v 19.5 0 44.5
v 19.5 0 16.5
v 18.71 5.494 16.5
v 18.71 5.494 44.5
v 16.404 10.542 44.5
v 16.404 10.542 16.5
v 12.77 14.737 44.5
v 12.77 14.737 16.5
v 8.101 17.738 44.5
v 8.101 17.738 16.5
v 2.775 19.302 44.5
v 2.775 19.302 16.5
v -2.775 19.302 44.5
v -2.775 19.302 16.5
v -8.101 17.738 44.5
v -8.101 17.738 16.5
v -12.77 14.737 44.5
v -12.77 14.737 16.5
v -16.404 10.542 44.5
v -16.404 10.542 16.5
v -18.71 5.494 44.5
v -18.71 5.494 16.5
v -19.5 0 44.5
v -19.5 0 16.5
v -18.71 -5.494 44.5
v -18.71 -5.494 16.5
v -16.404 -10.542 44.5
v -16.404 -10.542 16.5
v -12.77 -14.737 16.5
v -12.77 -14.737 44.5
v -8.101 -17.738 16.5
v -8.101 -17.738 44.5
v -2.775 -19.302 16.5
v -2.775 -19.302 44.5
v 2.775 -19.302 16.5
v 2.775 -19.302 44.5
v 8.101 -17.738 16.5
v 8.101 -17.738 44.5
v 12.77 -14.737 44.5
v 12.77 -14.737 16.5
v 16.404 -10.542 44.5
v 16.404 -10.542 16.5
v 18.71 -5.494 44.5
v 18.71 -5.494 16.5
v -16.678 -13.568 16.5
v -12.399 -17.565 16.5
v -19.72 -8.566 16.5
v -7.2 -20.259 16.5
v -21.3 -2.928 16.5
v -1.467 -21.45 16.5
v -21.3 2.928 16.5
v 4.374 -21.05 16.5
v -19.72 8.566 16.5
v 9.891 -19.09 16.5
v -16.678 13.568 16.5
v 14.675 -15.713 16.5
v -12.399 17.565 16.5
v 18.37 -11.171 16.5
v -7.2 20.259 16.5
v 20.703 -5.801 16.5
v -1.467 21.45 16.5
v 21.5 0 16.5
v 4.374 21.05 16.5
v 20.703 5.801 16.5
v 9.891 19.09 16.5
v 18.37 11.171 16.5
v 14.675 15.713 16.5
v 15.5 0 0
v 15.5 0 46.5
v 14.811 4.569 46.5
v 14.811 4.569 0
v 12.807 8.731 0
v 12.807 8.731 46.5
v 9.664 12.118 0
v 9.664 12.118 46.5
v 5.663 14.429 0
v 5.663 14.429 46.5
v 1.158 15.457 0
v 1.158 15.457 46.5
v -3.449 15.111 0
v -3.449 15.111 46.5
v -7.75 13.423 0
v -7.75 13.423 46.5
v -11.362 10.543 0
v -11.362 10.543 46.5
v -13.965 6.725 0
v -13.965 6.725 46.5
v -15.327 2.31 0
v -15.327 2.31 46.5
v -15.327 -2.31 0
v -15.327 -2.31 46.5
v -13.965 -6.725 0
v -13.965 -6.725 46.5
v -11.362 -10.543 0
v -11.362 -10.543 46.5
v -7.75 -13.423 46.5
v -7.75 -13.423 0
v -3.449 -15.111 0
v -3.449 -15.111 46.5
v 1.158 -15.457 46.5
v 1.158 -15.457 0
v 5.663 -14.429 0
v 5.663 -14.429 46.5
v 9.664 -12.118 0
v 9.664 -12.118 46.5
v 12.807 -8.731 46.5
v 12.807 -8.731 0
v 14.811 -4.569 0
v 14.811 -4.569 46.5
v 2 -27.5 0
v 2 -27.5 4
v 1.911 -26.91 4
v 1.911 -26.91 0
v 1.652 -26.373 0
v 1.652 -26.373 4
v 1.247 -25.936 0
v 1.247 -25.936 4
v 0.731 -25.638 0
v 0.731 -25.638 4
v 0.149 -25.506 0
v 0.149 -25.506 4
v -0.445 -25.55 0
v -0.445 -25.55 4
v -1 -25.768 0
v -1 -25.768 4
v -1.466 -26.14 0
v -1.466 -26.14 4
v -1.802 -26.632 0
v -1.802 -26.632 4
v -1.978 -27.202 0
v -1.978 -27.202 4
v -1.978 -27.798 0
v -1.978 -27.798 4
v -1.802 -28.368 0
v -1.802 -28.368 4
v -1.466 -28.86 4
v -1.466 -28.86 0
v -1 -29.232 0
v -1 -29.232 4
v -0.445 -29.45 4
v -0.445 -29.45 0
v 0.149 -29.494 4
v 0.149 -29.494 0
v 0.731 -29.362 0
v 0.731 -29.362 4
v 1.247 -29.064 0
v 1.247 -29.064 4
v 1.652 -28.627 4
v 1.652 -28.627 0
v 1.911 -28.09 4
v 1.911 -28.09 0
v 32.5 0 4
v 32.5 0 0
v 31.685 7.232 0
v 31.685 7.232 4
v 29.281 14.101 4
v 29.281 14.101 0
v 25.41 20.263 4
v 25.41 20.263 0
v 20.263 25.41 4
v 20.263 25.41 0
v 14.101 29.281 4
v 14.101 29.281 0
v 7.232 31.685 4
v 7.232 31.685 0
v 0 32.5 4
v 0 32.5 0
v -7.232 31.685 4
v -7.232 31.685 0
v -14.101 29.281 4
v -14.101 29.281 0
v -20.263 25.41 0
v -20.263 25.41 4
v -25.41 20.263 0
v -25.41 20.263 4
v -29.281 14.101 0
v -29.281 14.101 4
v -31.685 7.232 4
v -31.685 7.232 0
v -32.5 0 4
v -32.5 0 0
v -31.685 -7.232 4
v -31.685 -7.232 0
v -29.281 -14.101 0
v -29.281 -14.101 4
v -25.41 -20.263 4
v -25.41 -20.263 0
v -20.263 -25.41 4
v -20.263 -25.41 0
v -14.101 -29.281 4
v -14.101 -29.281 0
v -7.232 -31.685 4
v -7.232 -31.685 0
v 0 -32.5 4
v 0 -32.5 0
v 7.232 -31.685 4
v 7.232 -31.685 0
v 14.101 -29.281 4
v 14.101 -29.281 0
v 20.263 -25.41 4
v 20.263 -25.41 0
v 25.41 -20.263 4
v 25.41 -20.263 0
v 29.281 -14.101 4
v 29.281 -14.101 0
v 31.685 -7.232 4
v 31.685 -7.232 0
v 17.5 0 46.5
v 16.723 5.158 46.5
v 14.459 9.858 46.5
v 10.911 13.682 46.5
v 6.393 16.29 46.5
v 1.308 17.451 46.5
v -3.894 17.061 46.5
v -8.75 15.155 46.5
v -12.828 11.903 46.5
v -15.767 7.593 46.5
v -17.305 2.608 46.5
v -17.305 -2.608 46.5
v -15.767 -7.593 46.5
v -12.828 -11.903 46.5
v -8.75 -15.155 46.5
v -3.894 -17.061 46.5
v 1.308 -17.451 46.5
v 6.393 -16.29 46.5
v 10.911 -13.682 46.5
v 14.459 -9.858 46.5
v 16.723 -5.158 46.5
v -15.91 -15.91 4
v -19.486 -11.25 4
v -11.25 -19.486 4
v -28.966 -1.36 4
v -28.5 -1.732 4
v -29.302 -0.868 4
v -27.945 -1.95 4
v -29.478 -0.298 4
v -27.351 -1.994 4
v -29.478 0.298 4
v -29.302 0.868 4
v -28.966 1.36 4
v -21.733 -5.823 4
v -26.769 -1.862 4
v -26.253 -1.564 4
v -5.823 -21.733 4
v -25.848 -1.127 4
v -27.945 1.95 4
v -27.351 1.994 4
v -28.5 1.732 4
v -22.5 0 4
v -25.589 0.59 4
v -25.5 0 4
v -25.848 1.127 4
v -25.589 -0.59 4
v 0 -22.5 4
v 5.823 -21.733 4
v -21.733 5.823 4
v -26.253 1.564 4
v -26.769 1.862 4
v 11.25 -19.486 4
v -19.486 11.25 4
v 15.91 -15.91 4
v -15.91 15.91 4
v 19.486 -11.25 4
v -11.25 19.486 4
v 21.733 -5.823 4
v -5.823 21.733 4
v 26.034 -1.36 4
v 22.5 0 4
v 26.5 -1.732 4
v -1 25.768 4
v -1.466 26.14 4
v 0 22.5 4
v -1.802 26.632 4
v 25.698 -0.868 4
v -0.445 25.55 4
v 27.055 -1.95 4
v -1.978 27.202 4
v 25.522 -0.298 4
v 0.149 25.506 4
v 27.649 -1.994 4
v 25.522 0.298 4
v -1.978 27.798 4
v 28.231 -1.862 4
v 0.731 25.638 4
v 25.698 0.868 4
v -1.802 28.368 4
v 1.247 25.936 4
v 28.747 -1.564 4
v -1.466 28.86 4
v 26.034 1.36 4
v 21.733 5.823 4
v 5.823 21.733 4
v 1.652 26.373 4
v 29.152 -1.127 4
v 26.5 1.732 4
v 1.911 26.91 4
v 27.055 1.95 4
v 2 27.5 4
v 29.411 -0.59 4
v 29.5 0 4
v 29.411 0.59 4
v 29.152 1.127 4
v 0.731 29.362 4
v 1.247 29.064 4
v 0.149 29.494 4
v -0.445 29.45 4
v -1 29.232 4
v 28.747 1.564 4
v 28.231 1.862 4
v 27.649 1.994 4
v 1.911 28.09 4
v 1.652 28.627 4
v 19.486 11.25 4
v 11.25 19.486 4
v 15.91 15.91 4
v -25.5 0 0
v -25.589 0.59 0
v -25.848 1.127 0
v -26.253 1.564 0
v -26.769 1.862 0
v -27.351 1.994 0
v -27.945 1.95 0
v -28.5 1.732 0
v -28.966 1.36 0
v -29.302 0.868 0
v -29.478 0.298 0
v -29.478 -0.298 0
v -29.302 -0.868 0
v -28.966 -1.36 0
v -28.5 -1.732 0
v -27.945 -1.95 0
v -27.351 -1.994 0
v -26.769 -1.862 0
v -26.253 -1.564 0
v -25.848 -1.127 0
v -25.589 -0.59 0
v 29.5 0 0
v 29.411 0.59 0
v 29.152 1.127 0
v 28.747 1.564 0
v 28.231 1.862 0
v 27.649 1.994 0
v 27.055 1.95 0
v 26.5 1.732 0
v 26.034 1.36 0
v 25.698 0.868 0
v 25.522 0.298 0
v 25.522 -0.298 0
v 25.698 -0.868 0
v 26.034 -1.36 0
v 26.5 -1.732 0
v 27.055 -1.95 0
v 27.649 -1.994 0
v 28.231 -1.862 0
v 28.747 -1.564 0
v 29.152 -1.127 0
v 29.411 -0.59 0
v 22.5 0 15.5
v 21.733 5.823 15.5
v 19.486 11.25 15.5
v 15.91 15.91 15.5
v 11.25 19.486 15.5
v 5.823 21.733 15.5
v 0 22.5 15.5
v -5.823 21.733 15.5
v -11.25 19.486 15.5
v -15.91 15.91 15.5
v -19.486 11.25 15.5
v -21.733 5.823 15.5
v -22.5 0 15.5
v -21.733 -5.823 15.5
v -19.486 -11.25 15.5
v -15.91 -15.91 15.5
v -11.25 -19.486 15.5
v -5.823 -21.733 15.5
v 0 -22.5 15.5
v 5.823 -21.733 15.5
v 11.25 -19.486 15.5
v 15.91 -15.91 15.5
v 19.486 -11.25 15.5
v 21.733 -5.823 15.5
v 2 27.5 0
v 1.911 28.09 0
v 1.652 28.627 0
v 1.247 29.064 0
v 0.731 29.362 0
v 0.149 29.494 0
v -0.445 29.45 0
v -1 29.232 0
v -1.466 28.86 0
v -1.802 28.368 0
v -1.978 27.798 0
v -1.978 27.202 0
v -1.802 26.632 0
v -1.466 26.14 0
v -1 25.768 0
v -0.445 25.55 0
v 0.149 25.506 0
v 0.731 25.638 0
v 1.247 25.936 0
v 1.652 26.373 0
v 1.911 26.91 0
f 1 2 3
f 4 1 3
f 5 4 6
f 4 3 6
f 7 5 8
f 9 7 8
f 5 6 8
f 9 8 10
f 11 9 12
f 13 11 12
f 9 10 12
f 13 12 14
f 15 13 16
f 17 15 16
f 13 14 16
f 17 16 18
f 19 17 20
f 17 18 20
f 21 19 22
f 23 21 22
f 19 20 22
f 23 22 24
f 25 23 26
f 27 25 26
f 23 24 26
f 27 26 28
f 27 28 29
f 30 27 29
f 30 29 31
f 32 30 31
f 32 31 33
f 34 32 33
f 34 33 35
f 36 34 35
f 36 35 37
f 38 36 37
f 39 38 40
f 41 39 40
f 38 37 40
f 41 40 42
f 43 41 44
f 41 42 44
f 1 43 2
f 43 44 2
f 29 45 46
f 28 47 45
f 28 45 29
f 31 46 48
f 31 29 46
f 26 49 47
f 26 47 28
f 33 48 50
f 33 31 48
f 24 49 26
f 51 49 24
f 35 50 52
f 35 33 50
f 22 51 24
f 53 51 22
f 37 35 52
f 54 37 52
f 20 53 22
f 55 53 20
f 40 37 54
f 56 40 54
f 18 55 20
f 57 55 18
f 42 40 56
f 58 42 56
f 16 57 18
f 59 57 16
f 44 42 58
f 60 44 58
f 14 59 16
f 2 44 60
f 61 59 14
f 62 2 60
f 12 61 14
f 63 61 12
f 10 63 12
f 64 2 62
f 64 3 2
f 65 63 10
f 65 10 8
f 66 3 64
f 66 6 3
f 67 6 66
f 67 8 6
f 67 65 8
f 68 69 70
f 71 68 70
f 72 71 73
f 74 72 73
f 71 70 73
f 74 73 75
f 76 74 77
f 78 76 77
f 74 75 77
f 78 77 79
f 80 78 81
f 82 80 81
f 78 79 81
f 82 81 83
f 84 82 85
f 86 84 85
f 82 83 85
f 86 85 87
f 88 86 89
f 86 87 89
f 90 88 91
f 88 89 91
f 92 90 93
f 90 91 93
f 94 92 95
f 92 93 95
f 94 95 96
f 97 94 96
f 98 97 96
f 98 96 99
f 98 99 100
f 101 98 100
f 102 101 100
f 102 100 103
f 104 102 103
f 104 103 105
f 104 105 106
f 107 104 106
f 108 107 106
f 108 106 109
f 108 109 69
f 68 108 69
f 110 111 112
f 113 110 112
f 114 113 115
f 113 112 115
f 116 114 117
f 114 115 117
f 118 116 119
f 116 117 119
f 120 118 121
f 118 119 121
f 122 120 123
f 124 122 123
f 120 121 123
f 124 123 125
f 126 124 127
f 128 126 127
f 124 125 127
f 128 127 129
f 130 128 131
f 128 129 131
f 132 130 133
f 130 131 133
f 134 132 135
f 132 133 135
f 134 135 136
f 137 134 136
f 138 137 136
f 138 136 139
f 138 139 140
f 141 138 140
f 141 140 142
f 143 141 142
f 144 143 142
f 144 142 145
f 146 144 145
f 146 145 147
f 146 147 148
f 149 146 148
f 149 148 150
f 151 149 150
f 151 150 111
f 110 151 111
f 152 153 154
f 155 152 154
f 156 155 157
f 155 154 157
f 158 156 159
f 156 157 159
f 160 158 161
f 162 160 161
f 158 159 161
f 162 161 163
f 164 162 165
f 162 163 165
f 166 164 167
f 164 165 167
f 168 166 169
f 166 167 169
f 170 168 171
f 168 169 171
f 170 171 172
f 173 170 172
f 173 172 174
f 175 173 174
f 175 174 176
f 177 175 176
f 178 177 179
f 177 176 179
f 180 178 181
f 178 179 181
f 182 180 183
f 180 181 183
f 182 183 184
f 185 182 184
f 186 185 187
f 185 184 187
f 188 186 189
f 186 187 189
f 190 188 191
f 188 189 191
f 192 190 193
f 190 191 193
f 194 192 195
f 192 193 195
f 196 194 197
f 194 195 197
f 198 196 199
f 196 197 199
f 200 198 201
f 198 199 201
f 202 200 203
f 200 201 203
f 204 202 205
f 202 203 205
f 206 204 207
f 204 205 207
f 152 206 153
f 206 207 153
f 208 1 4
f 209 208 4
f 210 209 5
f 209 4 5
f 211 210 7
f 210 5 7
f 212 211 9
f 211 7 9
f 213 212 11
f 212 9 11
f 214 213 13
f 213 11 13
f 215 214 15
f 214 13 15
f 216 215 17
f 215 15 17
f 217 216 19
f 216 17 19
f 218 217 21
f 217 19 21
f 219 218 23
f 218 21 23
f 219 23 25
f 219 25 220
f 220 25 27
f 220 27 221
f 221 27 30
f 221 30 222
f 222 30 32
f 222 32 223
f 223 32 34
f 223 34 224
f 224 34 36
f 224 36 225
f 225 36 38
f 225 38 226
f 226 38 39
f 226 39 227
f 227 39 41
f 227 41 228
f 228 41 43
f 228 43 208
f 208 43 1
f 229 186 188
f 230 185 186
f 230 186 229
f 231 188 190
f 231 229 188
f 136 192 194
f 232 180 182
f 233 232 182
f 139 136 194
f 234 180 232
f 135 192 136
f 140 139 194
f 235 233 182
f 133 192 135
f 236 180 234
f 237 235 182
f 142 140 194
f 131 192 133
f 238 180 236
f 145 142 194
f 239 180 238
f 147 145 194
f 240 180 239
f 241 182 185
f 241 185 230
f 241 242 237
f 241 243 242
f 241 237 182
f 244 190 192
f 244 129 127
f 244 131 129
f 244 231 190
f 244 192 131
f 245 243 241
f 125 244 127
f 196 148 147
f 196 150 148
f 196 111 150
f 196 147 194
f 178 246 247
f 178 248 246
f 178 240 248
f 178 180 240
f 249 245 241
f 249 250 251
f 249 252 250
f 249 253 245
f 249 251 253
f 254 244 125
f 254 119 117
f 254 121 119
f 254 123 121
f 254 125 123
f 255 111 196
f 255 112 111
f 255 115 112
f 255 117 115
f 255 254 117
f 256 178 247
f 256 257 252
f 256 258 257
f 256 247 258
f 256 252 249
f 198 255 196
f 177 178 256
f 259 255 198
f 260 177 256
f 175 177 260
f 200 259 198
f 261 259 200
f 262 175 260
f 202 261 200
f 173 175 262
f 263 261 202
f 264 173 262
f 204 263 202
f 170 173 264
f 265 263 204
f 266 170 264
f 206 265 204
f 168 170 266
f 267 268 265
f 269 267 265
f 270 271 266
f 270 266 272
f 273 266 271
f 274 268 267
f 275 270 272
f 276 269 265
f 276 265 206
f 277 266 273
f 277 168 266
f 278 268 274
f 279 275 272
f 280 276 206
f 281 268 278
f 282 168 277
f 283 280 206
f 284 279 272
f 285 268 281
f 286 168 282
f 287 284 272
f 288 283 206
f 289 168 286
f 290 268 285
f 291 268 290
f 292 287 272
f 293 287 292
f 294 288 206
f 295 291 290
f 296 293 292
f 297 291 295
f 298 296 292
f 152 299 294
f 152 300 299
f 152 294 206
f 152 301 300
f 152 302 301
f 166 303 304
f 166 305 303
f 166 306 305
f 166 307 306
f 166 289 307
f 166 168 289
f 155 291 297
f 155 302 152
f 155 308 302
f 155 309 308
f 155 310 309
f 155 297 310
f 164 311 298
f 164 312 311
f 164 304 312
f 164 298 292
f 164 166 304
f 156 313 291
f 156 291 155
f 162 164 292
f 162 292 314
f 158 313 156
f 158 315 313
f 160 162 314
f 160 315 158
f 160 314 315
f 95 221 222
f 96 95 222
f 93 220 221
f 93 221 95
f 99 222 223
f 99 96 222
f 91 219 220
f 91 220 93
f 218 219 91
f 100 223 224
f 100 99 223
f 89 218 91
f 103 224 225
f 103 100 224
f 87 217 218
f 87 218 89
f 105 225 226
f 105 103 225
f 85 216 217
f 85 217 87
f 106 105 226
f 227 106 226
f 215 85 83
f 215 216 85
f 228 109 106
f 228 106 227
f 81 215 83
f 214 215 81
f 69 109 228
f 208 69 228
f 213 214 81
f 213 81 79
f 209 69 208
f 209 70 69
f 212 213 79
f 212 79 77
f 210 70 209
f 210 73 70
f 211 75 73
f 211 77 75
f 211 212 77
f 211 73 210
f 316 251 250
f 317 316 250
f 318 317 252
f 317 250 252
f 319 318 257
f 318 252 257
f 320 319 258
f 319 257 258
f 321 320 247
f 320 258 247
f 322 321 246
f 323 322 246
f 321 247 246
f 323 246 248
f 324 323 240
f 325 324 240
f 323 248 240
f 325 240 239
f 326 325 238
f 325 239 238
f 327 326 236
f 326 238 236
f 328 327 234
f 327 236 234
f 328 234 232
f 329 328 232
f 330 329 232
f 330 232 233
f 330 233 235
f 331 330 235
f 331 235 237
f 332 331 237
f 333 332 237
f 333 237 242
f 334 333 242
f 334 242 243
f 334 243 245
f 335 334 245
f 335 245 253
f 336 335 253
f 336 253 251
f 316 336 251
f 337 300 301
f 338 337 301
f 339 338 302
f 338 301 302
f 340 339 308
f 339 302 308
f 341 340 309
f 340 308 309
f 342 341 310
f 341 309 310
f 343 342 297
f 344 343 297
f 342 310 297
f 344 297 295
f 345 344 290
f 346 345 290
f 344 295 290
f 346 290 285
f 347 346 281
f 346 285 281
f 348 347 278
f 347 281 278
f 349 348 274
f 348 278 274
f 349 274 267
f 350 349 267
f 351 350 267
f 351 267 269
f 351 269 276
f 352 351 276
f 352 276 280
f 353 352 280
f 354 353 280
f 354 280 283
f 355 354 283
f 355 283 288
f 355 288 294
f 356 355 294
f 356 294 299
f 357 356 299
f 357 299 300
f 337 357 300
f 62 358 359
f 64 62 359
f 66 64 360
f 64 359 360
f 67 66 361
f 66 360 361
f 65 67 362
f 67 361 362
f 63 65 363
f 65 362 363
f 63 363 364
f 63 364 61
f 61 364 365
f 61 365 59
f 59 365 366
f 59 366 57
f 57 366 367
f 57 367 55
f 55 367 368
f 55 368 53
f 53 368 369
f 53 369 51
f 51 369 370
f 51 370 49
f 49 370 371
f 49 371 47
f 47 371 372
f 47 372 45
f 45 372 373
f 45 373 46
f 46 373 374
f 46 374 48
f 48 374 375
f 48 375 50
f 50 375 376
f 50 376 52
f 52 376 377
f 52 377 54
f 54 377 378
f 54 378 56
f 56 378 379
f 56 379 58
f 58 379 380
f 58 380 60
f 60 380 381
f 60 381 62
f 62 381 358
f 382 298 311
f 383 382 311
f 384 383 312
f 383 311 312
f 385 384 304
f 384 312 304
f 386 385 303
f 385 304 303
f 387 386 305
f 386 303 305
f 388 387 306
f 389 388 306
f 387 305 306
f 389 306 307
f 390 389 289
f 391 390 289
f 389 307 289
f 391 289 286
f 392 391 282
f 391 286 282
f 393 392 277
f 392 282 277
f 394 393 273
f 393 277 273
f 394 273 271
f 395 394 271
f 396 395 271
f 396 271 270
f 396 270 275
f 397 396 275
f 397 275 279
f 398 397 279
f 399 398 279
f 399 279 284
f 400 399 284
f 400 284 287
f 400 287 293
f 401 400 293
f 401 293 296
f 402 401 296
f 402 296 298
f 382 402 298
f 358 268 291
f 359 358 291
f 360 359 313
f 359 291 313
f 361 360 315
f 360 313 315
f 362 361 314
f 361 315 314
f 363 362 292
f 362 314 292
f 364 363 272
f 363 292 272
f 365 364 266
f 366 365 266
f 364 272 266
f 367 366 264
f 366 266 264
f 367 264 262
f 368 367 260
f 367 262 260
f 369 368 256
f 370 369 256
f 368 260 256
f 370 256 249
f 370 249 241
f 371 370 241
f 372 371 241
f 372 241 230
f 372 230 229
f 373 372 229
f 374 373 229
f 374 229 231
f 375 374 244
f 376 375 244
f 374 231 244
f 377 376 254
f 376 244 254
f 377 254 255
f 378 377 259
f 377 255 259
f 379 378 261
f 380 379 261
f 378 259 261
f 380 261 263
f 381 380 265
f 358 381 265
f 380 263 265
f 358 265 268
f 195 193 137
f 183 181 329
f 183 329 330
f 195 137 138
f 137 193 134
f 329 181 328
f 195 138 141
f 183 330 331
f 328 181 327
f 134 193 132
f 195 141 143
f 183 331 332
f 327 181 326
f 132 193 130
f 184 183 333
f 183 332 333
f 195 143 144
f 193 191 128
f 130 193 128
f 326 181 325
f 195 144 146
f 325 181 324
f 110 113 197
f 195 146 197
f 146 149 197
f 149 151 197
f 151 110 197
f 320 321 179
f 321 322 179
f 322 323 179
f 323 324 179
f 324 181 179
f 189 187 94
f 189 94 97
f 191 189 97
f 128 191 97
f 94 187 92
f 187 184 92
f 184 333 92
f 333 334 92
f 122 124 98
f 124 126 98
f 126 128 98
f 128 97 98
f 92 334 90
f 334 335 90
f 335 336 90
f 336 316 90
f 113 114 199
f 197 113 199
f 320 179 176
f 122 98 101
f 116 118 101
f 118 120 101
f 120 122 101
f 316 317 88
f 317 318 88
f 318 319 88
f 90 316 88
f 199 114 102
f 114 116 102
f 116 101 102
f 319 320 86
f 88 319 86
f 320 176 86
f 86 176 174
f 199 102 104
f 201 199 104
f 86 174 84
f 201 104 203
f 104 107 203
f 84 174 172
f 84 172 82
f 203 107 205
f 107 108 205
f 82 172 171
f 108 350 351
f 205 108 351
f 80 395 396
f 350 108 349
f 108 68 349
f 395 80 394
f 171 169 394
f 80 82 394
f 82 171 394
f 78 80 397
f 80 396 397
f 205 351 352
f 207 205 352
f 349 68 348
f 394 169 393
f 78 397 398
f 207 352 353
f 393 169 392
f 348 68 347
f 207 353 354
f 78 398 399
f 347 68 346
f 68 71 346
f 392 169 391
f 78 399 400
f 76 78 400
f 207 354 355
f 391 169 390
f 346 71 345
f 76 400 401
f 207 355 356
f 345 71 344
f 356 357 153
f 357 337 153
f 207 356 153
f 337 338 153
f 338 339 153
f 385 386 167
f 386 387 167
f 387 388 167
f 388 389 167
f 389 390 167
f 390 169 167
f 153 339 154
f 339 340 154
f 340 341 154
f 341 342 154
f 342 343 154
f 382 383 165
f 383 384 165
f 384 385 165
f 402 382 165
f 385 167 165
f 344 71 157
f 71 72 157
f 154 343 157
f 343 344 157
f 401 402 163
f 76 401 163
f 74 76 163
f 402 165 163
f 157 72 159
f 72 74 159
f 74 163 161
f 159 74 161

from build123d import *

# Parameters (mm, degrees)
F0_R     = 32.5
F1_DEPTH = 4
F2_R     = 22.5
F3_DEPTH = 12.5
F4_R     = 19.5
F5_DEPTH = 30
F6_R     = 15.5
F7_DEPTH = 46.501
F8_R     = 2
F9_DEPTH = 4.001
F10_SIZE = 2
F11_SIZE = 1


with BuildPart() as f1:
    # F0 (on Top) → F1 (new body)
    with BuildSketch(Plane.XY):
        Circle(F0_R)
    extrude(amount=F1_DEPTH)

    # F2 (on face) → F3 (join)
    with BuildSketch(Plane.XY.offset(4)):
        Circle(F2_R)
    extrude(amount=F3_DEPTH)

    # F4 (on face) → F5 (join)
    with BuildSketch(Plane.XY.offset(16.5)):
        Circle(F4_R)
    extrude(amount=F5_DEPTH)

    # F6 (on face) → F7 (cut, through all)
    with BuildSketch(Plane.XY.offset(46.5)):
        Circle(F6_R)
    extrude(amount=-F7_DEPTH, mode=Mode.SUBTRACT)

    # F8 (on face) → F9 (cut, through all)
    with BuildSketch(Plane.XY.offset(4)):
        with Locations((0, 27.5)):
            Circle(F8_R)
        with Locations((27.5, 0)):
            Circle(F8_R)
        with Locations((0, -27.5)):
            Circle(F8_R)
        with Locations((-27.5, 0)):
            Circle(F8_R)
    extrude(amount=-F9_DEPTH, mode=Mode.SUBTRACT)

    # F10
    f10_edges = [f1.edges().sort_by_distance(p)[0] for p in [
        (-19.5, 0, 46.5),
    ]]
    chamfer(f10_edges, length=F10_SIZE)

    # F11
    f11_edges = [f1.edges().sort_by_distance(p)[0] for p in [
        (-22.5, 0, 16.5),
    ]]
    chamfer(f11_edges, length=F11_SIZE)


solid = f1.part
